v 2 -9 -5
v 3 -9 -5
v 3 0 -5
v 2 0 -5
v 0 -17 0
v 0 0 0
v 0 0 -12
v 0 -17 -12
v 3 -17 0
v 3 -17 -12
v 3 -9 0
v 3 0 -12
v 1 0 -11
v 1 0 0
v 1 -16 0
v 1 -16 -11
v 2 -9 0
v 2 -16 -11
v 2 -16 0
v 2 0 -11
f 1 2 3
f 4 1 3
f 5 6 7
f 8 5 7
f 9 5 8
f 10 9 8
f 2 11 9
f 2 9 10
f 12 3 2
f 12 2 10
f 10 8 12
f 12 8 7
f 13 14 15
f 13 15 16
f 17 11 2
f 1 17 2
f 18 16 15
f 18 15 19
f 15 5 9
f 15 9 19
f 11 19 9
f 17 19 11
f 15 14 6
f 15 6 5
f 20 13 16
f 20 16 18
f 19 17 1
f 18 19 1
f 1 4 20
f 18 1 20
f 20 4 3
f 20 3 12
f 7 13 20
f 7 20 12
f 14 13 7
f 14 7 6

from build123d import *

# Parameters (mm, degrees)
SKETCH1_W           = 12
SKETCH1_H           = 17
BOSS_EXTRUDE1_DEPTH = 3
SKETCH3_W           = 1
SKETCH3_H           = 11
CUT_EXTRUDE1_DEPTH  = 16
CUT_EXTRUDE2_REACH  = 23.024
SKETCH2_W           = 5
SKETCH2_H           = 9


with BuildPart() as part:
    # Sketch1 → Boss-Extrude1 (new body)
    with BuildSketch(Plane(origin=(0, 0, 0), x_dir=(0, 0, -1), z_dir=(1, 0, 0))):
        with Locations((6, -8.5)):
            Rectangle(SKETCH1_W, SKETCH1_H)
    extrude(amount=BOSS_EXTRUDE1_DEPTH)

    # Sketch3 → Cut-Extrude1 (cut)
    with BuildSketch(Plane(origin=(0, 0, 0), x_dir=(1, 0, 0), z_dir=(0, 1, 0))):
        with Locations((1.5, 5.5)):
            Rectangle(SKETCH3_W, SKETCH3_H)
    extrude(amount=-CUT_EXTRUDE1_DEPTH, mode=Mode.SUBTRACT)

    # Sketch2 → Cut-Extrude2 (cut, up to next)
    with BuildSketch(Plane(origin=(3, 0, 0), x_dir=(0, 0, -1), z_dir=(1, 0, 0)), mode=Mode.PRIVATE) as cut_extrude2_sk1:
        with Locations((2.5, -4.5)):
            Rectangle(SKETCH2_W, SKETCH2_H)
    cut_extrude2_tool1 = extrude(cut_extrude2_sk1.sketch, amount=-CUT_EXTRUDE2_REACH, mode=Mode.PRIVATE) & part.part
    add(cut_extrude2_tool1.solids().sort_by_distance((3, -4.5, -2.5))[0], mode=Mode.SUBTRACT)


solid = part.part
